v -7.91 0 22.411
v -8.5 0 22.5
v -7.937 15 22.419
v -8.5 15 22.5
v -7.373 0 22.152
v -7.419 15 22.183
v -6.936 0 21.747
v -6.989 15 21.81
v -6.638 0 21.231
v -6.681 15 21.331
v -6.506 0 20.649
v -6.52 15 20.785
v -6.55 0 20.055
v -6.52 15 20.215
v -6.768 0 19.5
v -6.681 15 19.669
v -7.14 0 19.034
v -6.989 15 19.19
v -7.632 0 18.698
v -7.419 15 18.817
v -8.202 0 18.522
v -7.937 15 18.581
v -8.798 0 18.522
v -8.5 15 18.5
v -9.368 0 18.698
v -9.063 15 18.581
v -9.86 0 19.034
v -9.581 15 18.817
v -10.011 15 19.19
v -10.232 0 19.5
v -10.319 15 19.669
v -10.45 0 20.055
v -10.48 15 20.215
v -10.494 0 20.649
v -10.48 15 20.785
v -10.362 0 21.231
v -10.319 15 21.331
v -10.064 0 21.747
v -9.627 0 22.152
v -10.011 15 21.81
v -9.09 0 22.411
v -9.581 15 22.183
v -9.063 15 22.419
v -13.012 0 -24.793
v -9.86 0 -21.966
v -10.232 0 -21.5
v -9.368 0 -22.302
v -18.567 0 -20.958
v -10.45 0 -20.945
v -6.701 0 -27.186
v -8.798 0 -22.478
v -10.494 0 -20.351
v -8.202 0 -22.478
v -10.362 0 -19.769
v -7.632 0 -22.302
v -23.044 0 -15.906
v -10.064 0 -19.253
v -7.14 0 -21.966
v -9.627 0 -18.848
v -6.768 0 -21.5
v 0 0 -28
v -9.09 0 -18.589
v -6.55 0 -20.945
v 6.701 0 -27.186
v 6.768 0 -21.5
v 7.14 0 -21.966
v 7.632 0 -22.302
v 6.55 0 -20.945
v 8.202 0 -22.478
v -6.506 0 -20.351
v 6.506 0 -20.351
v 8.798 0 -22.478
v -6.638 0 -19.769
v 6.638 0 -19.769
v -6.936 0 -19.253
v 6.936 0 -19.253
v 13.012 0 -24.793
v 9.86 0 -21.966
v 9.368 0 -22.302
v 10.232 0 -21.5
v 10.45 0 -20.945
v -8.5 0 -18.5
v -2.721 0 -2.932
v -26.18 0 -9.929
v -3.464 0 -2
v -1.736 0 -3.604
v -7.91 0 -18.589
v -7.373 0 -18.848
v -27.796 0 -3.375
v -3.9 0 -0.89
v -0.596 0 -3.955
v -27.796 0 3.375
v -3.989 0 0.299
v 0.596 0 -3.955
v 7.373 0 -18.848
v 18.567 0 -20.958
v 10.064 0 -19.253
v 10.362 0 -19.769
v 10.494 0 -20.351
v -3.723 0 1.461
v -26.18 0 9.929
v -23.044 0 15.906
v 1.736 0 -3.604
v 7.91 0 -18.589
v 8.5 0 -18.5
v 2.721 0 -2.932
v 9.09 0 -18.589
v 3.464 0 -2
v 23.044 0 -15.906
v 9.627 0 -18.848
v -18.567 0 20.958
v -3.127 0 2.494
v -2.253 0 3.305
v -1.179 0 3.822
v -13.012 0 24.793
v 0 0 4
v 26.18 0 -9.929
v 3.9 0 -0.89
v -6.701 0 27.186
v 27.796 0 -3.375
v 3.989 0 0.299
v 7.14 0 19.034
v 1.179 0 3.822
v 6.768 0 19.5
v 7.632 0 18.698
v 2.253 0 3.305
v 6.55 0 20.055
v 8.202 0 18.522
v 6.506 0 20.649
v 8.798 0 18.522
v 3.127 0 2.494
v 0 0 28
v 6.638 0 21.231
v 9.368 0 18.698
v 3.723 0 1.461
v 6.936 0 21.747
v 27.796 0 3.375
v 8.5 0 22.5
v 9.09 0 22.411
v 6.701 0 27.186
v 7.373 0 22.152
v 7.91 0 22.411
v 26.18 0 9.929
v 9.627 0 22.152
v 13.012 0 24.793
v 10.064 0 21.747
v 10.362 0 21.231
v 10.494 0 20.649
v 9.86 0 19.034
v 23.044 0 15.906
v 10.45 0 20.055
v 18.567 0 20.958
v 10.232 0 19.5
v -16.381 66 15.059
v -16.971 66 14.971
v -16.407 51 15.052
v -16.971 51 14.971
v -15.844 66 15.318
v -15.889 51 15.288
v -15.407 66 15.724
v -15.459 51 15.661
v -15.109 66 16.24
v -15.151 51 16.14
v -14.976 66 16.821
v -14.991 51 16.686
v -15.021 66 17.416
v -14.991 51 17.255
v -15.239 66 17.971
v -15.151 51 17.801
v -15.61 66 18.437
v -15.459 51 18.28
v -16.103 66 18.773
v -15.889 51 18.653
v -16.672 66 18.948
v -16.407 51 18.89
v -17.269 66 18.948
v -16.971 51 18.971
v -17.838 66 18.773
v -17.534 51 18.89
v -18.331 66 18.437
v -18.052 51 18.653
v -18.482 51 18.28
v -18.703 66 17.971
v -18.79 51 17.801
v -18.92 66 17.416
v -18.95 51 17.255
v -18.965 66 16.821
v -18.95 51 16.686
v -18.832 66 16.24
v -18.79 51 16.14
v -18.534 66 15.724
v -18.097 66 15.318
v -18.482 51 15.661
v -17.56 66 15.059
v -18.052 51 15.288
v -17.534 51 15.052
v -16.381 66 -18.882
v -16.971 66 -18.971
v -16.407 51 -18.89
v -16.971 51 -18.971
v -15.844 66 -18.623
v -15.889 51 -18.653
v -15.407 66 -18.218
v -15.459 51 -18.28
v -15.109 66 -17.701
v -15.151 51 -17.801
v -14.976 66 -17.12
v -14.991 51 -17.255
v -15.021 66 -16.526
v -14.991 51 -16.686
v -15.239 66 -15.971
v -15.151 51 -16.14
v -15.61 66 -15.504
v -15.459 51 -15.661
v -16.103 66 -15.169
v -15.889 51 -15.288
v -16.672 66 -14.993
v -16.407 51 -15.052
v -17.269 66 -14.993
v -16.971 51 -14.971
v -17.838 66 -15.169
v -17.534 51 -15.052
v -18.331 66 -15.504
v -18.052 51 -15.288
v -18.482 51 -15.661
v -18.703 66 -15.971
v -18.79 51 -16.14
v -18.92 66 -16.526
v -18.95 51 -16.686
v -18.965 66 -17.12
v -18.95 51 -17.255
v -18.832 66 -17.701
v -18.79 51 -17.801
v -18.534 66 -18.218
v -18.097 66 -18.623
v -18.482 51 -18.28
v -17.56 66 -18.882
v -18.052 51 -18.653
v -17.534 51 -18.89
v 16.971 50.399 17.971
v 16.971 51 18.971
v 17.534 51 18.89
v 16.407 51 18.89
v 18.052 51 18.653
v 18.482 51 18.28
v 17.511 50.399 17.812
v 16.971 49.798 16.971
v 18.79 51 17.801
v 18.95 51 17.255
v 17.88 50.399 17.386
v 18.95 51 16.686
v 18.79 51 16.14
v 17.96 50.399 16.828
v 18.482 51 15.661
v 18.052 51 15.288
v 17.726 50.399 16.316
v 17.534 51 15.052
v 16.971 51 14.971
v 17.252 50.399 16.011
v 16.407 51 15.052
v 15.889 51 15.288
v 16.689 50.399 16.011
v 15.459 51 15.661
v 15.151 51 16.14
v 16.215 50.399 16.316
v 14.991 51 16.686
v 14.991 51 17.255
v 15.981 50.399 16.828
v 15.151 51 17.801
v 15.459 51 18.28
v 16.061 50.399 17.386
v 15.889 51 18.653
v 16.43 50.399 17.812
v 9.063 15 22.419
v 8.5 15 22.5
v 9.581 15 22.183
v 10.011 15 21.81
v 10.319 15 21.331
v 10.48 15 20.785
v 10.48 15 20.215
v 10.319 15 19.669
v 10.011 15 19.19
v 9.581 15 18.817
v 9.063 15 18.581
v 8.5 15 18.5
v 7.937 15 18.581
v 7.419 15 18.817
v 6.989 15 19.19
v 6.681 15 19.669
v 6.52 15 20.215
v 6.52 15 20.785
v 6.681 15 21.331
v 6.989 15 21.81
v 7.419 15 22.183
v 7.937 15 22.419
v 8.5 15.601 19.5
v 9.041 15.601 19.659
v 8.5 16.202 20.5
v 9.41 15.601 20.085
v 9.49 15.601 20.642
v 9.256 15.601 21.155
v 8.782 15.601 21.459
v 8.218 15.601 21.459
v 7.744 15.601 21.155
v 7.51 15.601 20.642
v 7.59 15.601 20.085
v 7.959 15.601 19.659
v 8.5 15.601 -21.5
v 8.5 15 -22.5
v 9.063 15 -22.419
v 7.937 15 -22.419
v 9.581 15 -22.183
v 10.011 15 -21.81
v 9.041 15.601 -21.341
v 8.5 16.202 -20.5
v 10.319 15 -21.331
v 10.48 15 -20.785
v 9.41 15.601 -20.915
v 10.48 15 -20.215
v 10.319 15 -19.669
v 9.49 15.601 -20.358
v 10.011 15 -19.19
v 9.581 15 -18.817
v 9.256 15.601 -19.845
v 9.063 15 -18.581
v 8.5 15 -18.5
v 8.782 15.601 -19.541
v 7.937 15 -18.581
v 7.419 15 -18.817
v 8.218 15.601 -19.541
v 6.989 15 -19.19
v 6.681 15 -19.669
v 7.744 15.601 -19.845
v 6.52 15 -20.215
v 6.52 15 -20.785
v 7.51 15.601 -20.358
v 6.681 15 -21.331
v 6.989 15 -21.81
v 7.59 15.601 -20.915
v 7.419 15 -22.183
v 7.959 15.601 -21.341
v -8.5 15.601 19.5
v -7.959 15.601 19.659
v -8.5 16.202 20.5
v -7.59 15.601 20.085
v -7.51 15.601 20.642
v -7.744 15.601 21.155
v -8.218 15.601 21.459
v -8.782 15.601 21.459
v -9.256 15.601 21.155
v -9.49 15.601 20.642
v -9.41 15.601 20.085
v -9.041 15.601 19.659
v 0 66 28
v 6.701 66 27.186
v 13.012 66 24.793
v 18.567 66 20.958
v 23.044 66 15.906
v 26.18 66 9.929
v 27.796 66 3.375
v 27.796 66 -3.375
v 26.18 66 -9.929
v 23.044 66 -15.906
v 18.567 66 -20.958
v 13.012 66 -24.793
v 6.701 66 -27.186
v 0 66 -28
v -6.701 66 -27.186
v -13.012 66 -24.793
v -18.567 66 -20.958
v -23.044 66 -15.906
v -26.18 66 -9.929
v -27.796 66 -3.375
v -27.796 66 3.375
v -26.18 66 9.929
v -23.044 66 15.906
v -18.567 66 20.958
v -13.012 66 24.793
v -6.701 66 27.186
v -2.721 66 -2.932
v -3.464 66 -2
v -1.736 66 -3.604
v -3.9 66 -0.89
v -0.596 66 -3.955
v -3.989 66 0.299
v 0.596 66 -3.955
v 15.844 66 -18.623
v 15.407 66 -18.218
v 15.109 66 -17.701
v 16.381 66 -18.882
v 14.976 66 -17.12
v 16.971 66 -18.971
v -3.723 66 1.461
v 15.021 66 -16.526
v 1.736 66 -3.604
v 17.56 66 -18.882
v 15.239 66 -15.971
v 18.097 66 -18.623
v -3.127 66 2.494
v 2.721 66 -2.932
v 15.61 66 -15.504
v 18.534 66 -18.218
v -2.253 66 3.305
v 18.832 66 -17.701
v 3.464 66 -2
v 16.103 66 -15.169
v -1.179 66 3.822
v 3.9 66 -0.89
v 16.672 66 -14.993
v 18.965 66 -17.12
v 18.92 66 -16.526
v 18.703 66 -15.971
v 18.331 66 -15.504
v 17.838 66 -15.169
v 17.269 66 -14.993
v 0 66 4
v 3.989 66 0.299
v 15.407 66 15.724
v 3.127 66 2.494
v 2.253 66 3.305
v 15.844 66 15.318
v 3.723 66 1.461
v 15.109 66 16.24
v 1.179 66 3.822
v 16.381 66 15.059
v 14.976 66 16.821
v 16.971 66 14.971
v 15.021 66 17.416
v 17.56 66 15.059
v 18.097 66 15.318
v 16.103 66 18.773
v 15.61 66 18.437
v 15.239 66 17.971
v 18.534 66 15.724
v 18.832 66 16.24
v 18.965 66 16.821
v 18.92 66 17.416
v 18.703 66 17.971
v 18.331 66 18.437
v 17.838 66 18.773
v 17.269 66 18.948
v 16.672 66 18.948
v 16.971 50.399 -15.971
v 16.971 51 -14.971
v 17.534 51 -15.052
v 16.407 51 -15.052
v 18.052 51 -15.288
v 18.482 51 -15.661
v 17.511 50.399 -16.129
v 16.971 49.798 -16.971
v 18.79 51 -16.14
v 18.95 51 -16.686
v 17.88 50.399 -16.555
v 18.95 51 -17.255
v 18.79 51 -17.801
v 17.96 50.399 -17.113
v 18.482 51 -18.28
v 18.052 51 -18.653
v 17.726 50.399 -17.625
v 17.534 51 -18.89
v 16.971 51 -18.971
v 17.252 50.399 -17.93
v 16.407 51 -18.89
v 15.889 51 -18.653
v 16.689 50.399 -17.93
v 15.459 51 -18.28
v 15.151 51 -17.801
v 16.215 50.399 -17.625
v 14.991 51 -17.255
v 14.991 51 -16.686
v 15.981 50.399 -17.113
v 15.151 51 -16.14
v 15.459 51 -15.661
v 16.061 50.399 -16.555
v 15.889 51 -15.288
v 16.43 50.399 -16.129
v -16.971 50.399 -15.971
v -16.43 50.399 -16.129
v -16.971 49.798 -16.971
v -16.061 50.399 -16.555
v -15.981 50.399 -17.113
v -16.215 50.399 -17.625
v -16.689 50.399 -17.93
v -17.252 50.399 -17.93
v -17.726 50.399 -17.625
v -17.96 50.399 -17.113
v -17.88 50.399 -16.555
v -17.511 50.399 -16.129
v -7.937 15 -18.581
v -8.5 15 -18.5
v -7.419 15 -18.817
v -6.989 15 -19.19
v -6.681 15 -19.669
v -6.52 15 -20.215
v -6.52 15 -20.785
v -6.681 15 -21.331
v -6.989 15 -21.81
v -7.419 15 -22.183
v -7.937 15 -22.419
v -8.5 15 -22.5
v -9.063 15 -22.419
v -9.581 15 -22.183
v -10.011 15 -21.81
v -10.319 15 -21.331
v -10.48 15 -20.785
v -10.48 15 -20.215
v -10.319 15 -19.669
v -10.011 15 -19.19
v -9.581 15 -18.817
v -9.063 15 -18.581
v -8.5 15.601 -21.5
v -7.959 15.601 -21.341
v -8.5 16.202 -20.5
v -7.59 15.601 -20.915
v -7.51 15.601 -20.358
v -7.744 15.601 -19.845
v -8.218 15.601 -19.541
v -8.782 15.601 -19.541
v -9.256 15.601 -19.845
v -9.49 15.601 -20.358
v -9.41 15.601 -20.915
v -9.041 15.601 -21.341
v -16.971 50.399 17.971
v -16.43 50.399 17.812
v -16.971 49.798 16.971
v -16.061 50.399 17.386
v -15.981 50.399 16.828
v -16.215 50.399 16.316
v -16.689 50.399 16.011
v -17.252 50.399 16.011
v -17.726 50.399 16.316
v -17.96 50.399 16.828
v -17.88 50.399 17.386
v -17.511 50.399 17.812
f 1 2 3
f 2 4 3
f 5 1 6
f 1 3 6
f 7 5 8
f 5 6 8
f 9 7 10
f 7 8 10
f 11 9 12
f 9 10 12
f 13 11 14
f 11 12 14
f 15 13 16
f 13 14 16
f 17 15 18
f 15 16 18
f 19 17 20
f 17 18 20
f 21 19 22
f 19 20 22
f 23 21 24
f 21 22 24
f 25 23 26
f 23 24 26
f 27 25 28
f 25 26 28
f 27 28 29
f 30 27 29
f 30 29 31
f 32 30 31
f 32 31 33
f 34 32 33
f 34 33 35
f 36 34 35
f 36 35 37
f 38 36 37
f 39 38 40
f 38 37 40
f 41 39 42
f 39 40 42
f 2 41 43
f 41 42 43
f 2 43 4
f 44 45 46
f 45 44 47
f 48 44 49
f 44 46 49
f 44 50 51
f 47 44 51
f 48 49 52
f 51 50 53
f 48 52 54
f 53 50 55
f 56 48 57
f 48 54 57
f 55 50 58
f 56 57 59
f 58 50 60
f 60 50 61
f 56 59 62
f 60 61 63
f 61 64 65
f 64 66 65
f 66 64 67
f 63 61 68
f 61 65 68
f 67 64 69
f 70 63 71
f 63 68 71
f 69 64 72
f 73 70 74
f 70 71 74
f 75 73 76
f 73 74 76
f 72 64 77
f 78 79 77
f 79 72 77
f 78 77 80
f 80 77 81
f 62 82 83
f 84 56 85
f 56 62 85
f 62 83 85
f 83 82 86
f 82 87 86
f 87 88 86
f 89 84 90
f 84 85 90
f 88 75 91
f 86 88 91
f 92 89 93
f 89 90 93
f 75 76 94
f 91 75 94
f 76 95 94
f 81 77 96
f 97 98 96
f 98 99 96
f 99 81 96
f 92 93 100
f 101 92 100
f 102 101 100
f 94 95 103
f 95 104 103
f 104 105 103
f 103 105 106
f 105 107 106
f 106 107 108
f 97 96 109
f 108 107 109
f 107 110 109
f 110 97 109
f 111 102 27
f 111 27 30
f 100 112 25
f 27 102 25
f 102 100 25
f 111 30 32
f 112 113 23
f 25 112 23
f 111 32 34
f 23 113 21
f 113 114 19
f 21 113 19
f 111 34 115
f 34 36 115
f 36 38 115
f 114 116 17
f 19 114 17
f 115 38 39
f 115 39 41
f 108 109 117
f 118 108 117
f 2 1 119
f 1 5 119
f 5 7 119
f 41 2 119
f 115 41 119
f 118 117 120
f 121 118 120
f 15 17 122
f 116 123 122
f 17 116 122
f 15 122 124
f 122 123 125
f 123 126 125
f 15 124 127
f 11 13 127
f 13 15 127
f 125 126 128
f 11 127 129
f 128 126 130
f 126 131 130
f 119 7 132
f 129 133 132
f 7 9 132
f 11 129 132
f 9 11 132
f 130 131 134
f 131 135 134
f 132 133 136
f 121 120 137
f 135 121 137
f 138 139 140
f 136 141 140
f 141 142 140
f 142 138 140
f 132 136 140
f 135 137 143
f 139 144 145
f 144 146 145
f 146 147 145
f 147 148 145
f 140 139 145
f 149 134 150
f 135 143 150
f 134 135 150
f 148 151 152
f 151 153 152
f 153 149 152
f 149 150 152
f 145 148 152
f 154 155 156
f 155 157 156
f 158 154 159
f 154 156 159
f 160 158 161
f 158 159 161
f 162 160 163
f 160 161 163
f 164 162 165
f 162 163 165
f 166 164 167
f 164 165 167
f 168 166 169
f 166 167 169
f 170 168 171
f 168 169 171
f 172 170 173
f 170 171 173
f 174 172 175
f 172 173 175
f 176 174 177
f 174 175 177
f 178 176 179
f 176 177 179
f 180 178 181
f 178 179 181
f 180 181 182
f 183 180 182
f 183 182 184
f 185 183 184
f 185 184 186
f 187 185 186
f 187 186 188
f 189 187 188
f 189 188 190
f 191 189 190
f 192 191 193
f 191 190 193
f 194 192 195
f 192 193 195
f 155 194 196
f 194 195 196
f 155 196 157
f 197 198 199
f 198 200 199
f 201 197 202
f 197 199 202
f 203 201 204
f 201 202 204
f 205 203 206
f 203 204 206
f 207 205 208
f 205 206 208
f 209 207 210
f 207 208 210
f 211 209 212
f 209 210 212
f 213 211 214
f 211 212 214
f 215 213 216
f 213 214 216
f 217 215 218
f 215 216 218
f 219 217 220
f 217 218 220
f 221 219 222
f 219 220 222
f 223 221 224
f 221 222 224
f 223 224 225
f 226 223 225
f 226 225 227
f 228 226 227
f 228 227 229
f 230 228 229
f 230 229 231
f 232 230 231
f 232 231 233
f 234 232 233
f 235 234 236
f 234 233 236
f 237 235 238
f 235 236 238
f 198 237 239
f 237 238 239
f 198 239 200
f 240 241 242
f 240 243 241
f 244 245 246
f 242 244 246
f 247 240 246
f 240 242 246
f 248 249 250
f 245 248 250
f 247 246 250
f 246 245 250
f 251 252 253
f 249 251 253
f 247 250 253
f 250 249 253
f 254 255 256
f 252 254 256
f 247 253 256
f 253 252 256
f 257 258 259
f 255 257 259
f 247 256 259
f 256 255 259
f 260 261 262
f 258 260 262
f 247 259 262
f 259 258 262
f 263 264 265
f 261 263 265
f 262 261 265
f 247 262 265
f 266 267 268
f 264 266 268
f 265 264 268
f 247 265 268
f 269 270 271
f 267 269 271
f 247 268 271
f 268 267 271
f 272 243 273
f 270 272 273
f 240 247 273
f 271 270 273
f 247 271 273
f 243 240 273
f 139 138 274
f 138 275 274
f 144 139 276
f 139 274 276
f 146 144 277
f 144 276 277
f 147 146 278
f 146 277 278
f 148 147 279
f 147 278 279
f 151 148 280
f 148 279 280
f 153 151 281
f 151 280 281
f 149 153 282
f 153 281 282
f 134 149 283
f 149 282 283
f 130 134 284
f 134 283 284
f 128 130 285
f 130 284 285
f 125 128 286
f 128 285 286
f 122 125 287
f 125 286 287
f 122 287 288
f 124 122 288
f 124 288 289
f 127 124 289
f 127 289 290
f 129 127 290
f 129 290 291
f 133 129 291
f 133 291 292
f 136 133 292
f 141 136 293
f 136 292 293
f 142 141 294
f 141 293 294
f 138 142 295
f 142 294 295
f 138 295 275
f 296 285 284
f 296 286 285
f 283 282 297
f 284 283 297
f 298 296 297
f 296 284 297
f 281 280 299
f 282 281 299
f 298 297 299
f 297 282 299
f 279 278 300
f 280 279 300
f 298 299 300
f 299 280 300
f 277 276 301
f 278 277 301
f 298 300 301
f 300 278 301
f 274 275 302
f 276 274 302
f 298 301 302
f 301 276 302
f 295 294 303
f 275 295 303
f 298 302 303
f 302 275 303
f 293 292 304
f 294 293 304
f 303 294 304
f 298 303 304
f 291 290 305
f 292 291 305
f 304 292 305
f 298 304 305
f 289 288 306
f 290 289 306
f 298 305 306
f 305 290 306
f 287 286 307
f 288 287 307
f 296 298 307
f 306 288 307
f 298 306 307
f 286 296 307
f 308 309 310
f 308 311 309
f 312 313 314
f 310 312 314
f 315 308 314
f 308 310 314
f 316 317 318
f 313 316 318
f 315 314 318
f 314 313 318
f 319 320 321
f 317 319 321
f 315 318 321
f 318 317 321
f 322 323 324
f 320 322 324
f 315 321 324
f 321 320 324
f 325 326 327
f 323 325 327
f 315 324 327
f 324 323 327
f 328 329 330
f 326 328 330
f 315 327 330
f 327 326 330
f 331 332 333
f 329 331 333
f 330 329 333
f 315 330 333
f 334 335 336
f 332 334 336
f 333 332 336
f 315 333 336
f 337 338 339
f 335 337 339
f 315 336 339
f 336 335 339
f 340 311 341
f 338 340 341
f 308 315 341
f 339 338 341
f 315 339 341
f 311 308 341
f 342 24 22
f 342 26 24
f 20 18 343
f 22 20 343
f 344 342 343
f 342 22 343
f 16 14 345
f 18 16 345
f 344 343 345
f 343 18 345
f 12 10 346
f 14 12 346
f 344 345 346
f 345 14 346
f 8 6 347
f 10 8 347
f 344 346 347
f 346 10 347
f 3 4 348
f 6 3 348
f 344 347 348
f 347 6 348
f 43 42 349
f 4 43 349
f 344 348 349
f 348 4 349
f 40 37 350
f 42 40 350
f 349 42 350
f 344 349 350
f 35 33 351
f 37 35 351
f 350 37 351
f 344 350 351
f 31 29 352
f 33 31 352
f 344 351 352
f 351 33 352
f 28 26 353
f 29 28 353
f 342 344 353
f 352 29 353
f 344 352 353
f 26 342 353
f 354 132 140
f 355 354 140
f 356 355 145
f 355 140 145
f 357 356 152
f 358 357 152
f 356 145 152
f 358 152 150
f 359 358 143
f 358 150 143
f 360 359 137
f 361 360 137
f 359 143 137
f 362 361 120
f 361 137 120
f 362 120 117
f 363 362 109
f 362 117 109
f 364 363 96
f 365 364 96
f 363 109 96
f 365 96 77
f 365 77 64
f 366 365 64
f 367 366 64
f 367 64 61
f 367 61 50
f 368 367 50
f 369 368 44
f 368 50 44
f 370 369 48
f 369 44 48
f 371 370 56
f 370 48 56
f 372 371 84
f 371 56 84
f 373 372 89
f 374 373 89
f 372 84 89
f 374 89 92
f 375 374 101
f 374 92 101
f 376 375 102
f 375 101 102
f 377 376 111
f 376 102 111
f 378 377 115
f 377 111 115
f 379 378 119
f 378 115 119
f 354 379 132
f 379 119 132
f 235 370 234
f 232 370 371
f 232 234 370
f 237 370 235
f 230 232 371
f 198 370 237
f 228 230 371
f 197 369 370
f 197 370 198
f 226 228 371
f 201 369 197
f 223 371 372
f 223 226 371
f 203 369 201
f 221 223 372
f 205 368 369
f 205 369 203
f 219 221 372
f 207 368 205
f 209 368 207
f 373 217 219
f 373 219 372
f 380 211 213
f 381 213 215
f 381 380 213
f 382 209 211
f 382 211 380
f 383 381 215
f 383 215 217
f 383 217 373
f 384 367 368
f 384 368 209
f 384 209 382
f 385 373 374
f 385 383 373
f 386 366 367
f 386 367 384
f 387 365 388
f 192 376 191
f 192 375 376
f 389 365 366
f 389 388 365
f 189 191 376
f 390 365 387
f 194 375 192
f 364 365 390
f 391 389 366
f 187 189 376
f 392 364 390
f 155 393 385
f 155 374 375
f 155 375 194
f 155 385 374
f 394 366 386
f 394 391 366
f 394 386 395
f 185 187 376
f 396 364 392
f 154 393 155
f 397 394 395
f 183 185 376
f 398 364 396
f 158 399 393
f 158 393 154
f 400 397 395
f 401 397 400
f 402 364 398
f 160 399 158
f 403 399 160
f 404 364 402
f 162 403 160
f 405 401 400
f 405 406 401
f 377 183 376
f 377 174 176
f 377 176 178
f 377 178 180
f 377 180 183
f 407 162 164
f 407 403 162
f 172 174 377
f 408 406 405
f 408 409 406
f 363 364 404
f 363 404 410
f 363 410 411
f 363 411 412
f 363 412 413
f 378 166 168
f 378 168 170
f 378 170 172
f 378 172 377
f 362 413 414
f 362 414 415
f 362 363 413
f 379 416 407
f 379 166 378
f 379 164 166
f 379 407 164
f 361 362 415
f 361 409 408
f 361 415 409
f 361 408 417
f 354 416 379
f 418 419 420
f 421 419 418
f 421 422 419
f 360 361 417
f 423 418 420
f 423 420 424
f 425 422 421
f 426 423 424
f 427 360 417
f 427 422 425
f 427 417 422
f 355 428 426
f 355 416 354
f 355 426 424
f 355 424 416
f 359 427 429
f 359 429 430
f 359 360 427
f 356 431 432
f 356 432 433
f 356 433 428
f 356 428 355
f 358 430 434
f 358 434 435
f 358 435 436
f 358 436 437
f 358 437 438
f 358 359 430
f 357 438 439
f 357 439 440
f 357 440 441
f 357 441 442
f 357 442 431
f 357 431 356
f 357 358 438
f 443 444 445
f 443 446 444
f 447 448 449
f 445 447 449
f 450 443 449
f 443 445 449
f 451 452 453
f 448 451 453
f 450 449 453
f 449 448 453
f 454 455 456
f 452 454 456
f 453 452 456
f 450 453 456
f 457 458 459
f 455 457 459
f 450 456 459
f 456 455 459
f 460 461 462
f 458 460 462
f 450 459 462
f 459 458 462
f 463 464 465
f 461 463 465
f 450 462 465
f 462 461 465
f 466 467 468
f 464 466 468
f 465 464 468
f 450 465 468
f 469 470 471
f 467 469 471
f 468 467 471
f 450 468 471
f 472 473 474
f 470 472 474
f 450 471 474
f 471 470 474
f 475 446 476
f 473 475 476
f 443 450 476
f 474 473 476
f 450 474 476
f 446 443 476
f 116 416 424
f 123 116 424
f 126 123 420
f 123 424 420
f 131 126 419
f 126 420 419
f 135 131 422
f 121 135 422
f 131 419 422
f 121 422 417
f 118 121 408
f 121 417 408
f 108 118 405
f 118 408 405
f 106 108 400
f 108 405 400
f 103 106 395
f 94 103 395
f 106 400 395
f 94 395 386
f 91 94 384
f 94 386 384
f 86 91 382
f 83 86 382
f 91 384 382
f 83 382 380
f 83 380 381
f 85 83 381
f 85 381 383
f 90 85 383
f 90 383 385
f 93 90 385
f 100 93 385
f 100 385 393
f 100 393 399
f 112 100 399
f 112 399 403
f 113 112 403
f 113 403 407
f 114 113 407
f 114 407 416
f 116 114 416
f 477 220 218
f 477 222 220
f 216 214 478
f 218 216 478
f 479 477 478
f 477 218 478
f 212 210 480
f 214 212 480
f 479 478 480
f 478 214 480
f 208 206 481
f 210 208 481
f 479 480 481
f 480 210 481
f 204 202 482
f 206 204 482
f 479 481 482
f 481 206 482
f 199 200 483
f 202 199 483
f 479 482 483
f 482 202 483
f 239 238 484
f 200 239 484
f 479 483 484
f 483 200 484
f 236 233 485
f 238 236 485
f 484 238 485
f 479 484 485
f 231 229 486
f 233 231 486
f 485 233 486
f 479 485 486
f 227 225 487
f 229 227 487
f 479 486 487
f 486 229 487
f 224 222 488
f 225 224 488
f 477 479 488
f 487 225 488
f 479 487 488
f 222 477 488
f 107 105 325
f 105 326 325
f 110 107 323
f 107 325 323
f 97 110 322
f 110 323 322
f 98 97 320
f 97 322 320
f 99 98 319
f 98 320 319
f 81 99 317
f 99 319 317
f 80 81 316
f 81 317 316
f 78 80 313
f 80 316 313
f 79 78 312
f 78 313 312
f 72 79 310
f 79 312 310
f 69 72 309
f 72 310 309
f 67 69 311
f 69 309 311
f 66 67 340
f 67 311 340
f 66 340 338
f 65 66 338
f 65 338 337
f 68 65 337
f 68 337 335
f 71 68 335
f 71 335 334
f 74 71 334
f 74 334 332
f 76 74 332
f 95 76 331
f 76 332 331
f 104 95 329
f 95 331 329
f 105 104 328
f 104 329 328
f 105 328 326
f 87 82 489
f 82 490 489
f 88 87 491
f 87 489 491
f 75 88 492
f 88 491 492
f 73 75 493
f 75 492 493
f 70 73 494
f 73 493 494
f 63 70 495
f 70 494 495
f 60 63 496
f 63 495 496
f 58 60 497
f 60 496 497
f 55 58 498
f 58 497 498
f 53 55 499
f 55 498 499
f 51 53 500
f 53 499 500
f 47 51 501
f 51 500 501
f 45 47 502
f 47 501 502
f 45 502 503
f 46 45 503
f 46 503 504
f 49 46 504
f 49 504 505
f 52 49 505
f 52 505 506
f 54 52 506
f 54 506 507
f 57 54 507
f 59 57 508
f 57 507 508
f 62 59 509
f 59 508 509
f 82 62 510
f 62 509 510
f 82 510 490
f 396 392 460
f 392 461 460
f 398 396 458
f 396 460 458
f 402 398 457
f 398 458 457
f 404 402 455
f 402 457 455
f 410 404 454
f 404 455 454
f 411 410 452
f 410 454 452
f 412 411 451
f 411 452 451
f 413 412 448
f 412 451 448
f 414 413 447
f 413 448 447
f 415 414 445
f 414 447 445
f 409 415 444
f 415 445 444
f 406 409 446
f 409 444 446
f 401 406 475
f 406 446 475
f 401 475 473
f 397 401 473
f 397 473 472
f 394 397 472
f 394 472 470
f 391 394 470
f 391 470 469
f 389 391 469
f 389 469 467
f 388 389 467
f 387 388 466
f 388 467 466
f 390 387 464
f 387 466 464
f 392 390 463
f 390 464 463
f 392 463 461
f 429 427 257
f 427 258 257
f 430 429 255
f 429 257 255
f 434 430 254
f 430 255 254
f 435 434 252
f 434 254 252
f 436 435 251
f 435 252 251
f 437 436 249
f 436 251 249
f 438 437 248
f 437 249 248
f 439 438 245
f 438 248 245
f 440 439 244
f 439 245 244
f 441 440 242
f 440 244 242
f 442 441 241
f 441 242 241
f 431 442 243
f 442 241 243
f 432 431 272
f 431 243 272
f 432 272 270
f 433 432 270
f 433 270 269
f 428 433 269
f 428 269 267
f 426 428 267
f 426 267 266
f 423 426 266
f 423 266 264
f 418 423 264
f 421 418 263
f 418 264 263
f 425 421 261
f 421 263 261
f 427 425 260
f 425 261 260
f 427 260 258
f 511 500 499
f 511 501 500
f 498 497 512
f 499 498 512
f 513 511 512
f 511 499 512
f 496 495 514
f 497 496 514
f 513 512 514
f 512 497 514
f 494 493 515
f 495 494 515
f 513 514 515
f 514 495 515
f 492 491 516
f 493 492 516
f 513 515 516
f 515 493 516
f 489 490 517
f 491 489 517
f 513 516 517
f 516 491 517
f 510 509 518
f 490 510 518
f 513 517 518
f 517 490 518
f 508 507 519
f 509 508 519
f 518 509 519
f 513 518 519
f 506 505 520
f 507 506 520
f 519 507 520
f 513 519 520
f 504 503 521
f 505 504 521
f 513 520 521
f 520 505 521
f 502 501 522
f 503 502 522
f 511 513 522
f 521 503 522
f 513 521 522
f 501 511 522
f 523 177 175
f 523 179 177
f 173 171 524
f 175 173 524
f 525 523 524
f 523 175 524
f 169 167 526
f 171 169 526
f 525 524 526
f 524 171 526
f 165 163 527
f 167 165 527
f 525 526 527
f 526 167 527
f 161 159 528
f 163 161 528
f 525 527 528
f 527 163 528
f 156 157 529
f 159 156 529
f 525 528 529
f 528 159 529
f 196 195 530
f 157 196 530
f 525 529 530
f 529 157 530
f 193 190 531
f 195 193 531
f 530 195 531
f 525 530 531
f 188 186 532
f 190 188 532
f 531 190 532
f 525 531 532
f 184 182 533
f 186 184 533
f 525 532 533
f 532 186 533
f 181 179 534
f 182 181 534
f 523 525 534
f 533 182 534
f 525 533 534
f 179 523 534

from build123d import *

# Parameters (mm, degrees)
SKETCH_1_R          = 28
EXTRUDE_1_DEPTH     = 66
MM_1_D              = 4
MM_1_DEPTH          = 15
MM_1_TIP            = 1.201721238
SKETCH_5_R          = 4
CUT_EXTRUDE_1_DEPTH = 77.96752562
MM_2_D              = 4
MM_2_DEPTH          = 15
MM_2_TIP            = 1.201721238


with BuildPart() as part:
    # 草图1 → 凸台-拉伸1 (new body)
    with BuildSketch(Plane(origin=(0, 0, 0), x_dir=(1, 0, 0), z_dir=(0, 1, 0))):
        with Locations(Location((0, 0, 0), (0, 0, 270))):
            Circle(SKETCH_1_R)
    extrude(amount=EXTRUDE_1_DEPTH)

    # 大小mm 暗销孔1
    with Locations(Plane(origin=(-16.970562748, 66, -16.970562748), x_dir=(0, 0, 1), z_dir=(0, 1, 0))):
        with Locations((0, 0), (0, 33.941125496), (33.941125496, 33.941125496), (33.941125496, 0)):
            Hole(MM_1_D / 2, depth=MM_1_DEPTH)
            with Locations((0, 0, -(MM_1_DEPTH + MM_1_TIP / 2))):  # 118° drill point
                Cone(0, MM_1_D / 2, MM_1_TIP, mode=Mode.SUBTRACT)

    # 草图5 → 切除-拉伸1 (cut, through all)
    with BuildSketch(Plane(origin=(0, 66, 0), x_dir=(1, 0, 0), z_dir=(0, 1, 0))):
        with Locations(Location((0, 0, 0), (0, 0, 270))):
            Circle(SKETCH_5_R)
    extrude(amount=-CUT_EXTRUDE_1_DEPTH, mode=Mode.SUBTRACT)

    # 大小mm 暗销孔2
    with Locations(Plane(origin=(-8.5, 0, 20.5), x_dir=(0, 0, -1), z_dir=(0, -1, 0))):
        with Locations((0, 0), (0, 17), (41, 17), (41, 0)):
            Hole(MM_2_D / 2, depth=MM_2_DEPTH)
            with Locations((0, 0, -(MM_2_DEPTH + MM_2_TIP / 2))):  # 118° drill point
                Cone(0, MM_2_D / 2, MM_2_TIP, mode=Mode.SUBTRACT)


solid = part.part
